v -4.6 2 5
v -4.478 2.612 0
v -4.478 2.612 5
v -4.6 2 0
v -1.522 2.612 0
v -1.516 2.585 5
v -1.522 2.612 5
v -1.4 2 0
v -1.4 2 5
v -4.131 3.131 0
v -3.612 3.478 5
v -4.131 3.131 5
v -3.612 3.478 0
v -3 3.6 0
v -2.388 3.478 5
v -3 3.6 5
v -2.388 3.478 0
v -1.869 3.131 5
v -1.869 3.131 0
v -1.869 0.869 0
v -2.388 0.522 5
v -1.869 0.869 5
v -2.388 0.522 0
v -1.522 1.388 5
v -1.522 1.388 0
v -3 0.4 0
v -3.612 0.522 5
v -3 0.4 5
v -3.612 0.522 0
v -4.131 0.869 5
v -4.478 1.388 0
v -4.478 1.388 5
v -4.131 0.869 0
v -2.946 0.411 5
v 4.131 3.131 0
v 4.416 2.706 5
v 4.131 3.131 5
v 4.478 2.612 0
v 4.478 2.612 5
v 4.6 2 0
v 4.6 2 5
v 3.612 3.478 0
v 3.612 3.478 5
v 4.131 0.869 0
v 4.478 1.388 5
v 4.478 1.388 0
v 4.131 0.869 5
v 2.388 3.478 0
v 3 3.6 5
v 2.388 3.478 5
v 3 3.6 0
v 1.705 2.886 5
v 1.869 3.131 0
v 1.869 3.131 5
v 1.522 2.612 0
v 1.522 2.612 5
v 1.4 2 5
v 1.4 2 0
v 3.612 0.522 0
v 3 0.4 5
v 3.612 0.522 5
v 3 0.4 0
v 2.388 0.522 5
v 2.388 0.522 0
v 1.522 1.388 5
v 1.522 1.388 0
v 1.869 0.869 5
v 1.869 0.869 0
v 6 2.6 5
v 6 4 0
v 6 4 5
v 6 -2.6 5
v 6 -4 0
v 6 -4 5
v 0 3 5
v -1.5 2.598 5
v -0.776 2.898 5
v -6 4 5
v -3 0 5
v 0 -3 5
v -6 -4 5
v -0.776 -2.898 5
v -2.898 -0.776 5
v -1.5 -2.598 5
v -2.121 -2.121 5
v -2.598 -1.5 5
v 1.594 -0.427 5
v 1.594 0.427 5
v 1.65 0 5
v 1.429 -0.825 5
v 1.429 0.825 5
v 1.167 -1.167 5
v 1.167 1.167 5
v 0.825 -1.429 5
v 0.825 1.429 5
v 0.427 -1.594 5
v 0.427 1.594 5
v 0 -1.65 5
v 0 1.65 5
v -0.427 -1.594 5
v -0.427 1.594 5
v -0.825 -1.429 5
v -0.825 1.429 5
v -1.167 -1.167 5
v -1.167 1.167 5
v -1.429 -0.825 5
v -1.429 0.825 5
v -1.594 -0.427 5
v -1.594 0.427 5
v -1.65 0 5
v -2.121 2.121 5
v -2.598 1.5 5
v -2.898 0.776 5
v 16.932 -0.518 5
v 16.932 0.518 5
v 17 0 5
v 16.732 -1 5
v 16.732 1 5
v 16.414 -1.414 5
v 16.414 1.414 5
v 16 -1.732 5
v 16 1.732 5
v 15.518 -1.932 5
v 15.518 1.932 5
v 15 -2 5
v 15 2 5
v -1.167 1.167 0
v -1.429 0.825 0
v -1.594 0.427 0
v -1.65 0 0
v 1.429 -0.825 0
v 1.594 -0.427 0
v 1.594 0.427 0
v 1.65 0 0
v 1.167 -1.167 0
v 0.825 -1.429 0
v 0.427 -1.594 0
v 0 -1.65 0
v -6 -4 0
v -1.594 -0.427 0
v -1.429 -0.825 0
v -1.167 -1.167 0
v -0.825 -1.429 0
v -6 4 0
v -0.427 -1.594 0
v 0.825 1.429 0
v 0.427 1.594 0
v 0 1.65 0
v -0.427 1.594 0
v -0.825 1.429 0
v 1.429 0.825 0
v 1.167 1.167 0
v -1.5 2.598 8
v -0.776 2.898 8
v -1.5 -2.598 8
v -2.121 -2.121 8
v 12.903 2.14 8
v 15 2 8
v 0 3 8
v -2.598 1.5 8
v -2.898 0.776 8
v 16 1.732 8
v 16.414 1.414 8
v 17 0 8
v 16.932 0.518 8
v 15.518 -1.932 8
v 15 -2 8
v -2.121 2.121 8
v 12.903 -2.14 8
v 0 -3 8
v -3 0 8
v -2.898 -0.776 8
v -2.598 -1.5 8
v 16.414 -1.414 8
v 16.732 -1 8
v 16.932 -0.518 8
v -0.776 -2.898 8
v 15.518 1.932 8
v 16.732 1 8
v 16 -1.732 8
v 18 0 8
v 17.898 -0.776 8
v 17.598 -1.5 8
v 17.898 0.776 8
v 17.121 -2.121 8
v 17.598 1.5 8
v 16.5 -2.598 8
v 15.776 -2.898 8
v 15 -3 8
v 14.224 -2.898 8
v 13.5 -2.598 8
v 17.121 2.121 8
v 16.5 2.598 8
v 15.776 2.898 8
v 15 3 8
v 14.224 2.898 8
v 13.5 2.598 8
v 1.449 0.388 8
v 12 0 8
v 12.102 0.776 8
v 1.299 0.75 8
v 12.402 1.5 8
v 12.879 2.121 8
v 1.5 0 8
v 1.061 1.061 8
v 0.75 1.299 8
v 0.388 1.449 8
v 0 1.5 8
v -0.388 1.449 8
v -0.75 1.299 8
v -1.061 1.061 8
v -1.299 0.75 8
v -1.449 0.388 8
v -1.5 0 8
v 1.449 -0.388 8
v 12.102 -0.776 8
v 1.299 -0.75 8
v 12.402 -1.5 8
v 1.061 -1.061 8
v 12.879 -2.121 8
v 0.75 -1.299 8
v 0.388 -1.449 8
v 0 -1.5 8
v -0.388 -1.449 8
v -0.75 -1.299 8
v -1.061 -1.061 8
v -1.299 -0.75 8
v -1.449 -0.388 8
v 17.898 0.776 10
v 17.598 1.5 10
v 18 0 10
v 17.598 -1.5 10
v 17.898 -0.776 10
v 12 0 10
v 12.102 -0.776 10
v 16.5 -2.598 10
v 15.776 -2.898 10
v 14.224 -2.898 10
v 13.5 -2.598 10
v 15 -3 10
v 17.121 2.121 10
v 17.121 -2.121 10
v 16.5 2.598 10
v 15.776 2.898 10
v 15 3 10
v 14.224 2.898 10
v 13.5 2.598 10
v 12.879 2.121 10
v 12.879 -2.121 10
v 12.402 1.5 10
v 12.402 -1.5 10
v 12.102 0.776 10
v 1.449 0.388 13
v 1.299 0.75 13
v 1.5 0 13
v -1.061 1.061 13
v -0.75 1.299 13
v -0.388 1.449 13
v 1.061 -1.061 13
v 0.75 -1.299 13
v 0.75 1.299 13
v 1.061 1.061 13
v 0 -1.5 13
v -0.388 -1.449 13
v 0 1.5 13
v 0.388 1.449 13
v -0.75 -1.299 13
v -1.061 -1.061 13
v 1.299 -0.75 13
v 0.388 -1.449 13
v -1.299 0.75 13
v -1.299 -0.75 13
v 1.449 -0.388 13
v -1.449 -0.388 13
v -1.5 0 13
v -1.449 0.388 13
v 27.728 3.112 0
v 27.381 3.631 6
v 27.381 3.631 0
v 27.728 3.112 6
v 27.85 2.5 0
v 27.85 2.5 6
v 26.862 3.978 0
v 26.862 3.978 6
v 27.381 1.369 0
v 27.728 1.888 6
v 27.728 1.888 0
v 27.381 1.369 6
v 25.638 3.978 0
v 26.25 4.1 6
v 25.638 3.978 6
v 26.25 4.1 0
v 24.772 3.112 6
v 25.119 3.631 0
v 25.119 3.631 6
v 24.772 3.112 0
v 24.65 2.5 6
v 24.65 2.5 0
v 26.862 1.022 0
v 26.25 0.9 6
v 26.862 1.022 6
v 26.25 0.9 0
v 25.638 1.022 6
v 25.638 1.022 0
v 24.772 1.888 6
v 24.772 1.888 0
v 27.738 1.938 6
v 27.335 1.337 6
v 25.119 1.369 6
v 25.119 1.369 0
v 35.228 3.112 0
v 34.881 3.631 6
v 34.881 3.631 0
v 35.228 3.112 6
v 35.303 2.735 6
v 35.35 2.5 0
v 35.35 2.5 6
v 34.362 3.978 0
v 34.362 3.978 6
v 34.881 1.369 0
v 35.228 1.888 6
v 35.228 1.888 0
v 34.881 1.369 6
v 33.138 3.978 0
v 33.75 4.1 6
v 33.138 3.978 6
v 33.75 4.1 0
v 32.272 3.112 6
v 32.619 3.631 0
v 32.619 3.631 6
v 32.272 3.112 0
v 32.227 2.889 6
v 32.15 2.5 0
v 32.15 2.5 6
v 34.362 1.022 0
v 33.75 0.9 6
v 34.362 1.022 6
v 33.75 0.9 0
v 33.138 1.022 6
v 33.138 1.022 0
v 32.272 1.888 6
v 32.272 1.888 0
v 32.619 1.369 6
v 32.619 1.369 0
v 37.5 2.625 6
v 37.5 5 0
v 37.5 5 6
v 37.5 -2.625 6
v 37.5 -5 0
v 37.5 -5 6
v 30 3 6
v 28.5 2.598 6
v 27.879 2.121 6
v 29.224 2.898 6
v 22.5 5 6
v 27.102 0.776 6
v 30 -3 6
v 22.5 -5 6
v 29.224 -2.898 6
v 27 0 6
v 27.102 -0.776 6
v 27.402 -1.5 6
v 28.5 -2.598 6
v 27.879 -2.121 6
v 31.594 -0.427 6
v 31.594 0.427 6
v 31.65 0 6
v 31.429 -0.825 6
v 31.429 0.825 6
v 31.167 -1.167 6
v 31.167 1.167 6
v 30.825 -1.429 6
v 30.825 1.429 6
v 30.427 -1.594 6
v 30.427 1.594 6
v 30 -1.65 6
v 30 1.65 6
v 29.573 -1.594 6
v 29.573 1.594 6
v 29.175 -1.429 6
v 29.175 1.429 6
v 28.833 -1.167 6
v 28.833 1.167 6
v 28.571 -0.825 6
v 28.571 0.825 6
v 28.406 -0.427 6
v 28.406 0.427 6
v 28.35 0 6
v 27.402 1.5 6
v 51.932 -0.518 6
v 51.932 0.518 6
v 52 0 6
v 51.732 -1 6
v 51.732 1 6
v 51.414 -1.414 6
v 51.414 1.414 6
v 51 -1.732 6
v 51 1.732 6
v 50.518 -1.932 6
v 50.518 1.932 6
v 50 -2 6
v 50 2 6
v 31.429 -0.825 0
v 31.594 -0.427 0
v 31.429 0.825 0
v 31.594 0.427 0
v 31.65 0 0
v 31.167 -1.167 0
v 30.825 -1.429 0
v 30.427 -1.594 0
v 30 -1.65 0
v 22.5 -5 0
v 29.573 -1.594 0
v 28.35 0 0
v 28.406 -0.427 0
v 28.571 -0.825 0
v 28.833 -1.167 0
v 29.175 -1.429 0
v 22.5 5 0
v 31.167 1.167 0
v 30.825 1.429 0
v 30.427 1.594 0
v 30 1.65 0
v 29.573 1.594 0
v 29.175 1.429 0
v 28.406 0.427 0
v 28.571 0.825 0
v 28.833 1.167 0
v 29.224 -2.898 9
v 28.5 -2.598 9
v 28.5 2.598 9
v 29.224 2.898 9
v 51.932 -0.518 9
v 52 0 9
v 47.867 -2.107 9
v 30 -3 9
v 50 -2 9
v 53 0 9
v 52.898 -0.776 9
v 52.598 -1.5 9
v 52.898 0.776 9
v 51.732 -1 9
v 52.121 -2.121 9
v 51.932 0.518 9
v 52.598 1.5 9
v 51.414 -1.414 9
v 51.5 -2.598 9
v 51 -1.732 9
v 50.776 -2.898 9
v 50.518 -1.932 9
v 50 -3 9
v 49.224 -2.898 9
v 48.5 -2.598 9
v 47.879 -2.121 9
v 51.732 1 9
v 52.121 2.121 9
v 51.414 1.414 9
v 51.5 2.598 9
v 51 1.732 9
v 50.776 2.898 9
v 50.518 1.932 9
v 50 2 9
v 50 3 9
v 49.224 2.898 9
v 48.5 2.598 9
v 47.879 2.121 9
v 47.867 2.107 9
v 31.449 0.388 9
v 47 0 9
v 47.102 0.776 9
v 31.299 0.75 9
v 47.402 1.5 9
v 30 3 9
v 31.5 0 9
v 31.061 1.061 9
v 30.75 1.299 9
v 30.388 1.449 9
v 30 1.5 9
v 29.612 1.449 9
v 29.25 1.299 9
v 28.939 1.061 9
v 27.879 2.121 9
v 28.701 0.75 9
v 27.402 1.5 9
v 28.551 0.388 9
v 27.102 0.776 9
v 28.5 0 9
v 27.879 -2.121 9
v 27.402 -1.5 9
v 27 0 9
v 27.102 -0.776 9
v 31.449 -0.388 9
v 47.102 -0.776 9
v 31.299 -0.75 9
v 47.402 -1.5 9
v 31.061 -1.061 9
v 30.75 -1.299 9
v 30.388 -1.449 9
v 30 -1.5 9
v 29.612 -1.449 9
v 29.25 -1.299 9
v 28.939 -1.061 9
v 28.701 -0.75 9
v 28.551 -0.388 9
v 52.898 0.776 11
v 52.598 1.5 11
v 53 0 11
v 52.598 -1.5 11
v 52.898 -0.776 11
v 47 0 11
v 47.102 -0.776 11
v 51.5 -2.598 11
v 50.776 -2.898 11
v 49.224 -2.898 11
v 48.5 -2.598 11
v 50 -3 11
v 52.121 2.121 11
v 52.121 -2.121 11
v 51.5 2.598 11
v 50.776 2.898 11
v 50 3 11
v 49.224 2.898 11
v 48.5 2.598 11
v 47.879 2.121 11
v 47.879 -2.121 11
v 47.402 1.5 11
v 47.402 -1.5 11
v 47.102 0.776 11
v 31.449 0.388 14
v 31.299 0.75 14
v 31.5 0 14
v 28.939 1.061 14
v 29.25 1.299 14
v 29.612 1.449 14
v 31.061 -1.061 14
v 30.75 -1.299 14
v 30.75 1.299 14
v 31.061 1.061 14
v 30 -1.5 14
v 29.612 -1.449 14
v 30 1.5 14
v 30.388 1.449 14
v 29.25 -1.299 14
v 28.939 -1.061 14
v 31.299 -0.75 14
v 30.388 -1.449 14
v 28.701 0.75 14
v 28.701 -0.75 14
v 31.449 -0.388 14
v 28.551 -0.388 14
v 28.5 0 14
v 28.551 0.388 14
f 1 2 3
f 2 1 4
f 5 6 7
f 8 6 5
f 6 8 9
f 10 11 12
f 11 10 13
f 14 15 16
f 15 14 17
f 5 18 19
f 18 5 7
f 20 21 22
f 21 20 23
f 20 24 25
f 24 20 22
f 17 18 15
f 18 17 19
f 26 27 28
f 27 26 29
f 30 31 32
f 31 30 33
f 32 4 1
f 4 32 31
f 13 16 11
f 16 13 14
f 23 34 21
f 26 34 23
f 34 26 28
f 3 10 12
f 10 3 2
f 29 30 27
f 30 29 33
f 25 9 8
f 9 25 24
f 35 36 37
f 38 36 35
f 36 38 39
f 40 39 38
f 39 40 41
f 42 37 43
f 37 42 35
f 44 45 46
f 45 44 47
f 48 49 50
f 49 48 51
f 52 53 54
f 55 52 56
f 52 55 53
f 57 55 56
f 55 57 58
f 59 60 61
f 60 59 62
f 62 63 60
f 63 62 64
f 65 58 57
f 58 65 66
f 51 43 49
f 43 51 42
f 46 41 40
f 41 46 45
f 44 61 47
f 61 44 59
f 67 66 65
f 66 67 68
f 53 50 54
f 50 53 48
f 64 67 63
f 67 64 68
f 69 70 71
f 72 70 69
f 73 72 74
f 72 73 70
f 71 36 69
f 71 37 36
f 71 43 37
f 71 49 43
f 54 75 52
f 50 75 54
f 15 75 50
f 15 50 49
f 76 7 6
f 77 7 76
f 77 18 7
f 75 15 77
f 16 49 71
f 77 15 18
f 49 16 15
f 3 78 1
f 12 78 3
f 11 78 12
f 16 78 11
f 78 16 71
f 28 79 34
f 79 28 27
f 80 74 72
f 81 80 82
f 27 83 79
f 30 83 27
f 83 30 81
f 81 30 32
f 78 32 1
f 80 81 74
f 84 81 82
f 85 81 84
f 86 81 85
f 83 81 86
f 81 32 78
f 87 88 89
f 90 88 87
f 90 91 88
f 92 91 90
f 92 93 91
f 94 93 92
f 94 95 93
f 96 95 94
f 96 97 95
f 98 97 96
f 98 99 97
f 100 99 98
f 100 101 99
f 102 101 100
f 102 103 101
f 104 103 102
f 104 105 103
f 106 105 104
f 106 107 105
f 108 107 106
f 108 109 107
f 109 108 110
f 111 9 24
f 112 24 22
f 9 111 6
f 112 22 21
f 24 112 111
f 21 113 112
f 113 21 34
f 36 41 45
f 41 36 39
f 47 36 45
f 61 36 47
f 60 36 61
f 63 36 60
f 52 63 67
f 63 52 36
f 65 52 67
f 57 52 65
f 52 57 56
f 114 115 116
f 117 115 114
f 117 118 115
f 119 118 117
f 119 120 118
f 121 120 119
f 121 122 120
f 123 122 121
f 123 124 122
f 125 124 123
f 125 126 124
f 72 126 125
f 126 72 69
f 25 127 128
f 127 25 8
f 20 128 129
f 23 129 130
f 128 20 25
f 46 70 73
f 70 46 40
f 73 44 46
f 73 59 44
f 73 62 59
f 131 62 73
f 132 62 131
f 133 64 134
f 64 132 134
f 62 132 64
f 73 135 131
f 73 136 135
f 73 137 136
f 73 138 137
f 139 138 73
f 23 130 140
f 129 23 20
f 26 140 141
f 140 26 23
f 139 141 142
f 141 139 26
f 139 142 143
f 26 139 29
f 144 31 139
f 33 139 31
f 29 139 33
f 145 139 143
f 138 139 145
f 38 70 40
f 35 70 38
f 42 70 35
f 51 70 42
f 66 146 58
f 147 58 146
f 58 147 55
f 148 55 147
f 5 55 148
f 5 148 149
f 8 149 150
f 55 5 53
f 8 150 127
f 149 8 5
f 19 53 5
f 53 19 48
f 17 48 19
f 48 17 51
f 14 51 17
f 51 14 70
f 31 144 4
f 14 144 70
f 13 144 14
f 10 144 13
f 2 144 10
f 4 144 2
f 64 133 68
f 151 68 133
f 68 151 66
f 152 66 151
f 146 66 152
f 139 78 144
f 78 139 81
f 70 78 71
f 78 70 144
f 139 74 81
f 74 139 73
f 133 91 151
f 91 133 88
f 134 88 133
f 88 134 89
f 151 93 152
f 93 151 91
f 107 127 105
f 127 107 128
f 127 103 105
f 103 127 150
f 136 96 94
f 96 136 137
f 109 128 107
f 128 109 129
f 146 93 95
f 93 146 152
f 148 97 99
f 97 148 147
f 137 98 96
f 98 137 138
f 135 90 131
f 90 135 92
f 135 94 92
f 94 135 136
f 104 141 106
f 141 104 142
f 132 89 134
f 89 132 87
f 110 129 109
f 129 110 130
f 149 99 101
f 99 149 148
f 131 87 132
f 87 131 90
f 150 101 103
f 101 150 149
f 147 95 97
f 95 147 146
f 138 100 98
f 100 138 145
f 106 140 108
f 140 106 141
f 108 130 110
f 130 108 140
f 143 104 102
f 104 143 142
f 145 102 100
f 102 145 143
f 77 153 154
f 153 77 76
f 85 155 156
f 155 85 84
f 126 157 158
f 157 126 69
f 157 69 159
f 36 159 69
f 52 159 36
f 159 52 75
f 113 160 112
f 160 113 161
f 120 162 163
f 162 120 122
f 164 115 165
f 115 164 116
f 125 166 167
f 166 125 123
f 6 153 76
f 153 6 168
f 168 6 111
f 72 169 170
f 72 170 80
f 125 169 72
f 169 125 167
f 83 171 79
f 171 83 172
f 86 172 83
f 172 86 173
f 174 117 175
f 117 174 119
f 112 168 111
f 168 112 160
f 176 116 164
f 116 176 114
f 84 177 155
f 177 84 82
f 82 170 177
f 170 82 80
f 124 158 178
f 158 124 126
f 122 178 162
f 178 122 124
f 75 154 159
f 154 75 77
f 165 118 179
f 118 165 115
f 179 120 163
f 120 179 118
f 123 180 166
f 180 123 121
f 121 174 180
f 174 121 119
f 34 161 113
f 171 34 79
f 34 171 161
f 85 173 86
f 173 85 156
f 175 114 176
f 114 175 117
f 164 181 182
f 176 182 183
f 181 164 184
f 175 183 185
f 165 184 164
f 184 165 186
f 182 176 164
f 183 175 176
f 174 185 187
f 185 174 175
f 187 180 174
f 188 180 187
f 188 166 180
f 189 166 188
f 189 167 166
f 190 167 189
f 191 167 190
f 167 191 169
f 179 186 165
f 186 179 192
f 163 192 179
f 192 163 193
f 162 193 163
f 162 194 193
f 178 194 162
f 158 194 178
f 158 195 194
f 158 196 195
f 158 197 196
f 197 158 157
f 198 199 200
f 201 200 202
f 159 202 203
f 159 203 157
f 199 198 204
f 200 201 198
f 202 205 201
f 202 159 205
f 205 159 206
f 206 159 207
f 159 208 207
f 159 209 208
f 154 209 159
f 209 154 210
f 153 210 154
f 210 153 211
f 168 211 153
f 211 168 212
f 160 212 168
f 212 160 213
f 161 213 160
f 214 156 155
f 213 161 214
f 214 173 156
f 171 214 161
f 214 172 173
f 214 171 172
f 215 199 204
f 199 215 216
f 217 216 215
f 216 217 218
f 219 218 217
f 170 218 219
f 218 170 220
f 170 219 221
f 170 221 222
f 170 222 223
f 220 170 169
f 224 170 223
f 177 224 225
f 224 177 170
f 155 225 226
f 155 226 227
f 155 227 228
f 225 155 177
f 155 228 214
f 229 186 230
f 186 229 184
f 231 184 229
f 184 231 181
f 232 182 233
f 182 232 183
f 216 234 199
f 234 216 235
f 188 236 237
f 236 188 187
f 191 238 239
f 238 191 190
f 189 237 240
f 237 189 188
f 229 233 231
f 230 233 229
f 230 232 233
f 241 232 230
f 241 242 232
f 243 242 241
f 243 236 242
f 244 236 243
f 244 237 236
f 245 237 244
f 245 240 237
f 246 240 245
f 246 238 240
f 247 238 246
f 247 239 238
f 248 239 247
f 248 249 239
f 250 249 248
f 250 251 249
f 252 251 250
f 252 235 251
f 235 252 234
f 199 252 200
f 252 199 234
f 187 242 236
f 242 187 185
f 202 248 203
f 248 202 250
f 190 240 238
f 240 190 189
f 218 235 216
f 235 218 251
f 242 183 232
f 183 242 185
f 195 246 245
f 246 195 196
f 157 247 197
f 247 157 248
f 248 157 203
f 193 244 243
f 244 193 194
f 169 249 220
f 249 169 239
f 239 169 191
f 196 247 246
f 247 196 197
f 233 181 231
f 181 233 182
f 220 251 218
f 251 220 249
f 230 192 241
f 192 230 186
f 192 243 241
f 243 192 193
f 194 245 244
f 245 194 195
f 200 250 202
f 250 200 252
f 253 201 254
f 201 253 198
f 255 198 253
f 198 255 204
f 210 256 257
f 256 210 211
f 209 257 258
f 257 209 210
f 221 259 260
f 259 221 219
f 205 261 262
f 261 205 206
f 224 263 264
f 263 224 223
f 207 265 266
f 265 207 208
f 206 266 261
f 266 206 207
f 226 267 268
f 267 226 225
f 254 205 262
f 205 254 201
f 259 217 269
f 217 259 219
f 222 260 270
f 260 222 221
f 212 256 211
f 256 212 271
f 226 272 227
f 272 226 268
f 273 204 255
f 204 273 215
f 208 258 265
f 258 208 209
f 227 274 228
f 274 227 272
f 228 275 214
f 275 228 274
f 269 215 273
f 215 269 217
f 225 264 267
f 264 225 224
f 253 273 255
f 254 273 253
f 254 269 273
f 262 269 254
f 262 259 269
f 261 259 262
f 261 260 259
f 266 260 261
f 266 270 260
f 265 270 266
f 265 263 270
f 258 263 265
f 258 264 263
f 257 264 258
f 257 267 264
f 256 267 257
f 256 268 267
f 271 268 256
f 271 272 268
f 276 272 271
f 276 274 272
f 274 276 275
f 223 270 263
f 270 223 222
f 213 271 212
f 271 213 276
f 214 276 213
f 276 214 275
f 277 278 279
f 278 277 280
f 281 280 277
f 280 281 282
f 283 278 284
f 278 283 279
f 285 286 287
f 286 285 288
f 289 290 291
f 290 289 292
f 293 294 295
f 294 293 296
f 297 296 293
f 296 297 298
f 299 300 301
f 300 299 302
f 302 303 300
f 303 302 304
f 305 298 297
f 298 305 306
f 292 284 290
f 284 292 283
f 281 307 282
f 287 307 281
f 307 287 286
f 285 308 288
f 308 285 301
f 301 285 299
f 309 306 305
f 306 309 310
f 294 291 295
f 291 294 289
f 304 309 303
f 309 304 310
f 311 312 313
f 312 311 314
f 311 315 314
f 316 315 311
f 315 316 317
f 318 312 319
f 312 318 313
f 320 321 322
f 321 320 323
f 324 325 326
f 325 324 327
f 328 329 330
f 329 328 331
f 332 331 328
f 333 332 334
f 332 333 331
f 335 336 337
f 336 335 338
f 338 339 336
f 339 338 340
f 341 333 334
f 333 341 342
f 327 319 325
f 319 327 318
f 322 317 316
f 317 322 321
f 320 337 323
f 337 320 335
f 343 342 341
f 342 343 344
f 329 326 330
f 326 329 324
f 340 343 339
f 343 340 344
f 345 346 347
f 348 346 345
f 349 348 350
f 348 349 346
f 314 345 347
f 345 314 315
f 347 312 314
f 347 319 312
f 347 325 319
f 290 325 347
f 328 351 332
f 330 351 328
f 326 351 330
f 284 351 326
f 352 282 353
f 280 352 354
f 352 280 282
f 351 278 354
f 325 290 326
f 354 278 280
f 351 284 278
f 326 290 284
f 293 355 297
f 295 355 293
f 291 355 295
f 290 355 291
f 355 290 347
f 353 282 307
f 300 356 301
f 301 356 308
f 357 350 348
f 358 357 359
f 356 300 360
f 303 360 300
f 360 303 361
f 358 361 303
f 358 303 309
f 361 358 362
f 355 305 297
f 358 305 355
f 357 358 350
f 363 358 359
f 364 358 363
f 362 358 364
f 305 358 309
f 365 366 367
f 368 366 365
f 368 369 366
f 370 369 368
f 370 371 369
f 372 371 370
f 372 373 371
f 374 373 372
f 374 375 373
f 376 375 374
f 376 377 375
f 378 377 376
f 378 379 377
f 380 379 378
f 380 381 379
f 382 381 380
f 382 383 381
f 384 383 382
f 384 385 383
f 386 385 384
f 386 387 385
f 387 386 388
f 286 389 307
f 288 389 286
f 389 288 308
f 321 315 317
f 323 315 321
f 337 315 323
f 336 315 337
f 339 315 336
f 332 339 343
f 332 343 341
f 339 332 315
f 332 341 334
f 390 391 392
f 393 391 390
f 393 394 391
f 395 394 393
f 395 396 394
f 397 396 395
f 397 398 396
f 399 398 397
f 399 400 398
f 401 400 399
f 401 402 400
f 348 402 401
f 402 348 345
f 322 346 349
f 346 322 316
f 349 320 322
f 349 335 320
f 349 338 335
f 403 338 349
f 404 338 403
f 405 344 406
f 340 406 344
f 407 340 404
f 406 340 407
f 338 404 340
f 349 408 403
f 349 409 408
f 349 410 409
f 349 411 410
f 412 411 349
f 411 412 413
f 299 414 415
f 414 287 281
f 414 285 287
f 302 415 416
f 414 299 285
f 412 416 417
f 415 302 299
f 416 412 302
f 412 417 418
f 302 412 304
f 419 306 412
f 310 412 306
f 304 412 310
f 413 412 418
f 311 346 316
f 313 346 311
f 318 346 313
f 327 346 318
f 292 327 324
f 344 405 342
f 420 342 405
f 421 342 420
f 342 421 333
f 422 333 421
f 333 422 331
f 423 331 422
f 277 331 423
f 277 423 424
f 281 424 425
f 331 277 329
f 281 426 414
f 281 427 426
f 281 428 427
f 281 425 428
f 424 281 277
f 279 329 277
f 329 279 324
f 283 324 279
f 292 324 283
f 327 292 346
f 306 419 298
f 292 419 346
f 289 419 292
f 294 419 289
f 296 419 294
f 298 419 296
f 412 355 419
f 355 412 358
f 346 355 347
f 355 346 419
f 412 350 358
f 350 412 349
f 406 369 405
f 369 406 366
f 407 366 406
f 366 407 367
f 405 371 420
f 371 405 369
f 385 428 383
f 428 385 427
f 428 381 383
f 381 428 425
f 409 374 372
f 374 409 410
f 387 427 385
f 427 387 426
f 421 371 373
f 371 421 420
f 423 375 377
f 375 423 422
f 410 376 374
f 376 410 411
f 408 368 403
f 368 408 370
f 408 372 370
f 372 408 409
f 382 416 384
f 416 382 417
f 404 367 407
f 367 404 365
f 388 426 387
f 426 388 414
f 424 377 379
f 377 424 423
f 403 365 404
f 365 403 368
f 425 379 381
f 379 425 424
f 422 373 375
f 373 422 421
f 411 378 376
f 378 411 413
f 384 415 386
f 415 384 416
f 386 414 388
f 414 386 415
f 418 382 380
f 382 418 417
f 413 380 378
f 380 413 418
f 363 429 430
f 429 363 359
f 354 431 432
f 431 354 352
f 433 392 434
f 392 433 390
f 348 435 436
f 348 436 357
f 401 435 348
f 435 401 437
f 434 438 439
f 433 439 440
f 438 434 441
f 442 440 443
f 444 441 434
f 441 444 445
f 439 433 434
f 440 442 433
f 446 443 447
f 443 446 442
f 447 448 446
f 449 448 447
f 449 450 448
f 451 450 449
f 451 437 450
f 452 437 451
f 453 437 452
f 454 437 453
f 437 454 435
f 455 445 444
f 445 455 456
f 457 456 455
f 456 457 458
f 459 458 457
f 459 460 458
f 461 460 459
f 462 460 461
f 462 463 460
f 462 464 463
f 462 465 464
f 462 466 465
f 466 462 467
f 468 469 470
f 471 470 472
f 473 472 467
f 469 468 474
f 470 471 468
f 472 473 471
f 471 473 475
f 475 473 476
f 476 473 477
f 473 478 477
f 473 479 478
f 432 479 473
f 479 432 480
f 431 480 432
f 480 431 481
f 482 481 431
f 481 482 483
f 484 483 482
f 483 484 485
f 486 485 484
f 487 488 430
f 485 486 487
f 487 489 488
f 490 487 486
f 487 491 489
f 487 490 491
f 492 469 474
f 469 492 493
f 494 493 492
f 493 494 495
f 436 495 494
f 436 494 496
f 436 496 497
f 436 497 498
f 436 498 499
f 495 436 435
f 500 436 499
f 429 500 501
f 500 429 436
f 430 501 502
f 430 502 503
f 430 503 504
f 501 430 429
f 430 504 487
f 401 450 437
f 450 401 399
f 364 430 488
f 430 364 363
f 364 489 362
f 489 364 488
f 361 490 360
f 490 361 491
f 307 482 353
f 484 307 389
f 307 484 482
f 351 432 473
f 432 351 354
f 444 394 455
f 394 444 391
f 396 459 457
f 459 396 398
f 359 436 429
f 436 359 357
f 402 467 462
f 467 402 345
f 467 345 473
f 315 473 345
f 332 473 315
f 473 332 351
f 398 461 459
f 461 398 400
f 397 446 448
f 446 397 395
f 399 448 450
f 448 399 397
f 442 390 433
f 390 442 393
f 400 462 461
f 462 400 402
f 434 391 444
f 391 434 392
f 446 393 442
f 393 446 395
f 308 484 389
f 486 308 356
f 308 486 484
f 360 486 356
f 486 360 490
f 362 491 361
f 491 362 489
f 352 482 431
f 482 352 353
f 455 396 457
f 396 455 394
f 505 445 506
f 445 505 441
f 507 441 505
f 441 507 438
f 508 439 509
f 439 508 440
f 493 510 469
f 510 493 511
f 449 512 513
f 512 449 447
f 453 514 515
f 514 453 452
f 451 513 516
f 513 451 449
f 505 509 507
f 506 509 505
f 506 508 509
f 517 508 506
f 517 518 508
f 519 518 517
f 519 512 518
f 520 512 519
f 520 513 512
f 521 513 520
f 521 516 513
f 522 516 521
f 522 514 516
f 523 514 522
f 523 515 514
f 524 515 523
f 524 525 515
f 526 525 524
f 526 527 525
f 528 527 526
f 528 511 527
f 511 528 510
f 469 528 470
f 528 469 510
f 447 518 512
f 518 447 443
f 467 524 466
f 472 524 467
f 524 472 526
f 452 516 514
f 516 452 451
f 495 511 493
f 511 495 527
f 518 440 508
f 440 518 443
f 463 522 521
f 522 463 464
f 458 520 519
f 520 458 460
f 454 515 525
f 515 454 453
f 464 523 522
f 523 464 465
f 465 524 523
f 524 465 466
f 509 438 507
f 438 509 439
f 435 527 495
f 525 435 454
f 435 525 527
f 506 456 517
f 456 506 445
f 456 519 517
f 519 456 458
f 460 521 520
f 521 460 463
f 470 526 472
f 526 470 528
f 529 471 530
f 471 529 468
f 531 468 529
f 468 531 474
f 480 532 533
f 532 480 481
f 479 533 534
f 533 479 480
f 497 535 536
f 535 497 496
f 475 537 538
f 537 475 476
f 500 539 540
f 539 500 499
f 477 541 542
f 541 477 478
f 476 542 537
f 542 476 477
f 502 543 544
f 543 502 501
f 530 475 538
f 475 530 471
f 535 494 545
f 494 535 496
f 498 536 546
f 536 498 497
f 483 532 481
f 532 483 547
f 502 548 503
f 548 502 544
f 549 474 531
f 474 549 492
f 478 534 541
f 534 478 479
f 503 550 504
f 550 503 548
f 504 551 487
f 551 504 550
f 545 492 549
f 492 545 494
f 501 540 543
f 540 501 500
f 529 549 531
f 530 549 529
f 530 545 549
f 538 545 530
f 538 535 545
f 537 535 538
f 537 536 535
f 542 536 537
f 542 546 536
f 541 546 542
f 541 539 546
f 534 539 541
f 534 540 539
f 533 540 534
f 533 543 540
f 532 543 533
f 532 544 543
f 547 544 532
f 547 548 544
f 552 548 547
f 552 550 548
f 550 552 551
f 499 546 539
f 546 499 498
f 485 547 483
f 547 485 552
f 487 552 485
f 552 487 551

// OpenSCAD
// PIVOT BRACKET MODULE
// For Starry Night Wave Surge Mechanism
// Mounts foam arm to wave structure with pivot connection
//
// Two variants:
//   Zone 2: 12mm x 8mm x 5mm at X=201, Y=42, Z=68mm
//   Zone 3: 15mm x 10mm x 6mm at X=126, Y=54, Z=77mm
//
// Features:
//   - Pivot hole for connecting rod
//   - Mounting holes for M3 screws to wave layer
//   - Foam arm attachment point

// === PARAMETERS ===

// Zone 2 Bracket (Mid Ocean)
ZONE2_BRACKET_SIZE = [12, 8, 5];    // [width, depth, height] mm
ZONE2_FOAM_ARM = 15;                // mm

// Zone 3 Bracket (Breaking Wave)
ZONE3_BRACKET_SIZE = [15, 10, 6];   // [width, depth, height] mm
ZONE3_FOAM_ARM = 20;                // mm

// Common parameters
PIVOT_HOLE_DIA = 3.3;              // mm (3mm pin + 0.3mm clearance)
PIN_DIAMETER = 3;                   // mm
MOUNTING_HOLE_DIA = 3.2;           // mm (M3 clearance)
ARM_WIDTH = 4;                      // mm
ARM_THICKNESS = 3;                  // mm

// Colors
C_BRACKET = [0.7, 0.7, 0.75];      // Metal color
C_ARM = [0.6, 0.6, 0.65];          // Slightly darker

// === MODULES ===

module pivot_bracket(size, arm_length) {
    // Bracket with pivot hole, mounting holes, and foam arm
    // size = [width, depth, height]
    // arm_length = distance to foam attachment point

    width = size[0];
    depth = size[1];
    height = size[2];

    // Bracket body
    color(C_BRACKET)
    difference() {
        // Main body
        translate([-width/2, -depth/2, 0])
            cube([width, depth, height]);

        // Pivot hole (vertical, for connecting rod)
        translate([0, 0, -1])
            cylinder(d=PIVOT_HOLE_DIA, h=height+2, $fn=24);

        // Mounting holes (2x, for M3 screws)
        for(x_off = [-width/4, width/4]) {
            translate([x_off, depth/4, -1])
                cylinder(d=MOUNTING_HOLE_DIA, h=height+2, $fn=16);
        }
    }

    // Pivot pin (extends up from bracket for rod connection)
    color(C_ARM)
    translate([0, 0, height])
        cylinder(d=PIN_DIAMETER, h=8, $fn=24);

    // Foam arm (extends horizontally)
    color(C_ARM)
    translate([0, 0, height])
        rotate([0, 0, 0])
            foam_arm(arm_length);
}

module foam_arm(arm_length) {
    // Arm that holds foam piece
    // Extends from pivot bracket to foam attachment point

    // Arm body
    hull() {
        // Base at pivot
        cylinder(d=ARM_WIDTH+2, h=ARM_THICKNESS, $fn=24);

        // End at foam attachment
        translate([arm_length, 0, 0])
            cylinder(d=ARM_WIDTH, h=ARM_THICKNESS, $fn=24);
    }

    // Foam attachment boss
    translate([arm_length, 0, ARM_THICKNESS])
        cylinder(d=ARM_WIDTH+2, h=2, $fn=24);
}

// Zone-specific convenience modules
module zone2_pivot_bracket() {
    pivot_bracket(ZONE2_BRACKET_SIZE, ZONE2_FOAM_ARM);
}

module zone3_pivot_bracket() {
    pivot_bracket(ZONE3_BRACKET_SIZE, ZONE3_FOAM_ARM);
}

// Bracket with vertical slider motion capability
// For the actual surge motion implementation
module surge_pivot_assembly(size, arm_length, surge_height=0) {
    // surge_height = current vertical offset from slider-crank kinematics

    width = size[0];
    depth = size[1];
    height = size[2];

    // Guide rail (fixed to structure)
    color(C_BRACKET)
    translate([-width/2-2, -depth/2, -5])
        cube([4, depth, 25]);

    // Sliding bracket (moves vertically)
    translate([0, 0, surge_height]) {
        // Slider body
        color(C_ARM)
        difference() {
            translate([-width/2, -depth/2, 0])
                cube([width, depth, height]);

            // Pivot hole for connecting rod
            translate([0, 0, -1])
                cylinder(d=PIVOT_HOLE_DIA, h=height+2, $fn=24);
        }

        // Foam arm
        translate([0, 0, height])
            foam_arm(arm_length);
    }
}

// === TEST RENDER ===

// Show both bracket variants
translate([0, 0, 0])
    zone2_pivot_bracket();

translate([30, 0, 0])
    zone3_pivot_bracket();

// Show surge assembly at different heights (uncomment)
// translate([60, 0, 0]) surge_pivot_assembly(ZONE3_BRACKET_SIZE, ZONE3_FOAM_ARM, 0);
// translate([90, 0, 0]) surge_pivot_assembly(ZONE3_BRACKET_SIZE, ZONE3_FOAM_ARM, 8);
// translate([120, 0, 0]) surge_pivot_assembly(ZONE3_BRACKET_SIZE, ZONE3_FOAM_ARM, 16);

// Animation test (uncomment)
// surge_h = sin($t * 360) * 8 + 8;  // 0 to 16mm stroke
// surge_pivot_assembly(ZONE3_BRACKET_SIZE, ZONE3_FOAM_ARM, surge_h);
